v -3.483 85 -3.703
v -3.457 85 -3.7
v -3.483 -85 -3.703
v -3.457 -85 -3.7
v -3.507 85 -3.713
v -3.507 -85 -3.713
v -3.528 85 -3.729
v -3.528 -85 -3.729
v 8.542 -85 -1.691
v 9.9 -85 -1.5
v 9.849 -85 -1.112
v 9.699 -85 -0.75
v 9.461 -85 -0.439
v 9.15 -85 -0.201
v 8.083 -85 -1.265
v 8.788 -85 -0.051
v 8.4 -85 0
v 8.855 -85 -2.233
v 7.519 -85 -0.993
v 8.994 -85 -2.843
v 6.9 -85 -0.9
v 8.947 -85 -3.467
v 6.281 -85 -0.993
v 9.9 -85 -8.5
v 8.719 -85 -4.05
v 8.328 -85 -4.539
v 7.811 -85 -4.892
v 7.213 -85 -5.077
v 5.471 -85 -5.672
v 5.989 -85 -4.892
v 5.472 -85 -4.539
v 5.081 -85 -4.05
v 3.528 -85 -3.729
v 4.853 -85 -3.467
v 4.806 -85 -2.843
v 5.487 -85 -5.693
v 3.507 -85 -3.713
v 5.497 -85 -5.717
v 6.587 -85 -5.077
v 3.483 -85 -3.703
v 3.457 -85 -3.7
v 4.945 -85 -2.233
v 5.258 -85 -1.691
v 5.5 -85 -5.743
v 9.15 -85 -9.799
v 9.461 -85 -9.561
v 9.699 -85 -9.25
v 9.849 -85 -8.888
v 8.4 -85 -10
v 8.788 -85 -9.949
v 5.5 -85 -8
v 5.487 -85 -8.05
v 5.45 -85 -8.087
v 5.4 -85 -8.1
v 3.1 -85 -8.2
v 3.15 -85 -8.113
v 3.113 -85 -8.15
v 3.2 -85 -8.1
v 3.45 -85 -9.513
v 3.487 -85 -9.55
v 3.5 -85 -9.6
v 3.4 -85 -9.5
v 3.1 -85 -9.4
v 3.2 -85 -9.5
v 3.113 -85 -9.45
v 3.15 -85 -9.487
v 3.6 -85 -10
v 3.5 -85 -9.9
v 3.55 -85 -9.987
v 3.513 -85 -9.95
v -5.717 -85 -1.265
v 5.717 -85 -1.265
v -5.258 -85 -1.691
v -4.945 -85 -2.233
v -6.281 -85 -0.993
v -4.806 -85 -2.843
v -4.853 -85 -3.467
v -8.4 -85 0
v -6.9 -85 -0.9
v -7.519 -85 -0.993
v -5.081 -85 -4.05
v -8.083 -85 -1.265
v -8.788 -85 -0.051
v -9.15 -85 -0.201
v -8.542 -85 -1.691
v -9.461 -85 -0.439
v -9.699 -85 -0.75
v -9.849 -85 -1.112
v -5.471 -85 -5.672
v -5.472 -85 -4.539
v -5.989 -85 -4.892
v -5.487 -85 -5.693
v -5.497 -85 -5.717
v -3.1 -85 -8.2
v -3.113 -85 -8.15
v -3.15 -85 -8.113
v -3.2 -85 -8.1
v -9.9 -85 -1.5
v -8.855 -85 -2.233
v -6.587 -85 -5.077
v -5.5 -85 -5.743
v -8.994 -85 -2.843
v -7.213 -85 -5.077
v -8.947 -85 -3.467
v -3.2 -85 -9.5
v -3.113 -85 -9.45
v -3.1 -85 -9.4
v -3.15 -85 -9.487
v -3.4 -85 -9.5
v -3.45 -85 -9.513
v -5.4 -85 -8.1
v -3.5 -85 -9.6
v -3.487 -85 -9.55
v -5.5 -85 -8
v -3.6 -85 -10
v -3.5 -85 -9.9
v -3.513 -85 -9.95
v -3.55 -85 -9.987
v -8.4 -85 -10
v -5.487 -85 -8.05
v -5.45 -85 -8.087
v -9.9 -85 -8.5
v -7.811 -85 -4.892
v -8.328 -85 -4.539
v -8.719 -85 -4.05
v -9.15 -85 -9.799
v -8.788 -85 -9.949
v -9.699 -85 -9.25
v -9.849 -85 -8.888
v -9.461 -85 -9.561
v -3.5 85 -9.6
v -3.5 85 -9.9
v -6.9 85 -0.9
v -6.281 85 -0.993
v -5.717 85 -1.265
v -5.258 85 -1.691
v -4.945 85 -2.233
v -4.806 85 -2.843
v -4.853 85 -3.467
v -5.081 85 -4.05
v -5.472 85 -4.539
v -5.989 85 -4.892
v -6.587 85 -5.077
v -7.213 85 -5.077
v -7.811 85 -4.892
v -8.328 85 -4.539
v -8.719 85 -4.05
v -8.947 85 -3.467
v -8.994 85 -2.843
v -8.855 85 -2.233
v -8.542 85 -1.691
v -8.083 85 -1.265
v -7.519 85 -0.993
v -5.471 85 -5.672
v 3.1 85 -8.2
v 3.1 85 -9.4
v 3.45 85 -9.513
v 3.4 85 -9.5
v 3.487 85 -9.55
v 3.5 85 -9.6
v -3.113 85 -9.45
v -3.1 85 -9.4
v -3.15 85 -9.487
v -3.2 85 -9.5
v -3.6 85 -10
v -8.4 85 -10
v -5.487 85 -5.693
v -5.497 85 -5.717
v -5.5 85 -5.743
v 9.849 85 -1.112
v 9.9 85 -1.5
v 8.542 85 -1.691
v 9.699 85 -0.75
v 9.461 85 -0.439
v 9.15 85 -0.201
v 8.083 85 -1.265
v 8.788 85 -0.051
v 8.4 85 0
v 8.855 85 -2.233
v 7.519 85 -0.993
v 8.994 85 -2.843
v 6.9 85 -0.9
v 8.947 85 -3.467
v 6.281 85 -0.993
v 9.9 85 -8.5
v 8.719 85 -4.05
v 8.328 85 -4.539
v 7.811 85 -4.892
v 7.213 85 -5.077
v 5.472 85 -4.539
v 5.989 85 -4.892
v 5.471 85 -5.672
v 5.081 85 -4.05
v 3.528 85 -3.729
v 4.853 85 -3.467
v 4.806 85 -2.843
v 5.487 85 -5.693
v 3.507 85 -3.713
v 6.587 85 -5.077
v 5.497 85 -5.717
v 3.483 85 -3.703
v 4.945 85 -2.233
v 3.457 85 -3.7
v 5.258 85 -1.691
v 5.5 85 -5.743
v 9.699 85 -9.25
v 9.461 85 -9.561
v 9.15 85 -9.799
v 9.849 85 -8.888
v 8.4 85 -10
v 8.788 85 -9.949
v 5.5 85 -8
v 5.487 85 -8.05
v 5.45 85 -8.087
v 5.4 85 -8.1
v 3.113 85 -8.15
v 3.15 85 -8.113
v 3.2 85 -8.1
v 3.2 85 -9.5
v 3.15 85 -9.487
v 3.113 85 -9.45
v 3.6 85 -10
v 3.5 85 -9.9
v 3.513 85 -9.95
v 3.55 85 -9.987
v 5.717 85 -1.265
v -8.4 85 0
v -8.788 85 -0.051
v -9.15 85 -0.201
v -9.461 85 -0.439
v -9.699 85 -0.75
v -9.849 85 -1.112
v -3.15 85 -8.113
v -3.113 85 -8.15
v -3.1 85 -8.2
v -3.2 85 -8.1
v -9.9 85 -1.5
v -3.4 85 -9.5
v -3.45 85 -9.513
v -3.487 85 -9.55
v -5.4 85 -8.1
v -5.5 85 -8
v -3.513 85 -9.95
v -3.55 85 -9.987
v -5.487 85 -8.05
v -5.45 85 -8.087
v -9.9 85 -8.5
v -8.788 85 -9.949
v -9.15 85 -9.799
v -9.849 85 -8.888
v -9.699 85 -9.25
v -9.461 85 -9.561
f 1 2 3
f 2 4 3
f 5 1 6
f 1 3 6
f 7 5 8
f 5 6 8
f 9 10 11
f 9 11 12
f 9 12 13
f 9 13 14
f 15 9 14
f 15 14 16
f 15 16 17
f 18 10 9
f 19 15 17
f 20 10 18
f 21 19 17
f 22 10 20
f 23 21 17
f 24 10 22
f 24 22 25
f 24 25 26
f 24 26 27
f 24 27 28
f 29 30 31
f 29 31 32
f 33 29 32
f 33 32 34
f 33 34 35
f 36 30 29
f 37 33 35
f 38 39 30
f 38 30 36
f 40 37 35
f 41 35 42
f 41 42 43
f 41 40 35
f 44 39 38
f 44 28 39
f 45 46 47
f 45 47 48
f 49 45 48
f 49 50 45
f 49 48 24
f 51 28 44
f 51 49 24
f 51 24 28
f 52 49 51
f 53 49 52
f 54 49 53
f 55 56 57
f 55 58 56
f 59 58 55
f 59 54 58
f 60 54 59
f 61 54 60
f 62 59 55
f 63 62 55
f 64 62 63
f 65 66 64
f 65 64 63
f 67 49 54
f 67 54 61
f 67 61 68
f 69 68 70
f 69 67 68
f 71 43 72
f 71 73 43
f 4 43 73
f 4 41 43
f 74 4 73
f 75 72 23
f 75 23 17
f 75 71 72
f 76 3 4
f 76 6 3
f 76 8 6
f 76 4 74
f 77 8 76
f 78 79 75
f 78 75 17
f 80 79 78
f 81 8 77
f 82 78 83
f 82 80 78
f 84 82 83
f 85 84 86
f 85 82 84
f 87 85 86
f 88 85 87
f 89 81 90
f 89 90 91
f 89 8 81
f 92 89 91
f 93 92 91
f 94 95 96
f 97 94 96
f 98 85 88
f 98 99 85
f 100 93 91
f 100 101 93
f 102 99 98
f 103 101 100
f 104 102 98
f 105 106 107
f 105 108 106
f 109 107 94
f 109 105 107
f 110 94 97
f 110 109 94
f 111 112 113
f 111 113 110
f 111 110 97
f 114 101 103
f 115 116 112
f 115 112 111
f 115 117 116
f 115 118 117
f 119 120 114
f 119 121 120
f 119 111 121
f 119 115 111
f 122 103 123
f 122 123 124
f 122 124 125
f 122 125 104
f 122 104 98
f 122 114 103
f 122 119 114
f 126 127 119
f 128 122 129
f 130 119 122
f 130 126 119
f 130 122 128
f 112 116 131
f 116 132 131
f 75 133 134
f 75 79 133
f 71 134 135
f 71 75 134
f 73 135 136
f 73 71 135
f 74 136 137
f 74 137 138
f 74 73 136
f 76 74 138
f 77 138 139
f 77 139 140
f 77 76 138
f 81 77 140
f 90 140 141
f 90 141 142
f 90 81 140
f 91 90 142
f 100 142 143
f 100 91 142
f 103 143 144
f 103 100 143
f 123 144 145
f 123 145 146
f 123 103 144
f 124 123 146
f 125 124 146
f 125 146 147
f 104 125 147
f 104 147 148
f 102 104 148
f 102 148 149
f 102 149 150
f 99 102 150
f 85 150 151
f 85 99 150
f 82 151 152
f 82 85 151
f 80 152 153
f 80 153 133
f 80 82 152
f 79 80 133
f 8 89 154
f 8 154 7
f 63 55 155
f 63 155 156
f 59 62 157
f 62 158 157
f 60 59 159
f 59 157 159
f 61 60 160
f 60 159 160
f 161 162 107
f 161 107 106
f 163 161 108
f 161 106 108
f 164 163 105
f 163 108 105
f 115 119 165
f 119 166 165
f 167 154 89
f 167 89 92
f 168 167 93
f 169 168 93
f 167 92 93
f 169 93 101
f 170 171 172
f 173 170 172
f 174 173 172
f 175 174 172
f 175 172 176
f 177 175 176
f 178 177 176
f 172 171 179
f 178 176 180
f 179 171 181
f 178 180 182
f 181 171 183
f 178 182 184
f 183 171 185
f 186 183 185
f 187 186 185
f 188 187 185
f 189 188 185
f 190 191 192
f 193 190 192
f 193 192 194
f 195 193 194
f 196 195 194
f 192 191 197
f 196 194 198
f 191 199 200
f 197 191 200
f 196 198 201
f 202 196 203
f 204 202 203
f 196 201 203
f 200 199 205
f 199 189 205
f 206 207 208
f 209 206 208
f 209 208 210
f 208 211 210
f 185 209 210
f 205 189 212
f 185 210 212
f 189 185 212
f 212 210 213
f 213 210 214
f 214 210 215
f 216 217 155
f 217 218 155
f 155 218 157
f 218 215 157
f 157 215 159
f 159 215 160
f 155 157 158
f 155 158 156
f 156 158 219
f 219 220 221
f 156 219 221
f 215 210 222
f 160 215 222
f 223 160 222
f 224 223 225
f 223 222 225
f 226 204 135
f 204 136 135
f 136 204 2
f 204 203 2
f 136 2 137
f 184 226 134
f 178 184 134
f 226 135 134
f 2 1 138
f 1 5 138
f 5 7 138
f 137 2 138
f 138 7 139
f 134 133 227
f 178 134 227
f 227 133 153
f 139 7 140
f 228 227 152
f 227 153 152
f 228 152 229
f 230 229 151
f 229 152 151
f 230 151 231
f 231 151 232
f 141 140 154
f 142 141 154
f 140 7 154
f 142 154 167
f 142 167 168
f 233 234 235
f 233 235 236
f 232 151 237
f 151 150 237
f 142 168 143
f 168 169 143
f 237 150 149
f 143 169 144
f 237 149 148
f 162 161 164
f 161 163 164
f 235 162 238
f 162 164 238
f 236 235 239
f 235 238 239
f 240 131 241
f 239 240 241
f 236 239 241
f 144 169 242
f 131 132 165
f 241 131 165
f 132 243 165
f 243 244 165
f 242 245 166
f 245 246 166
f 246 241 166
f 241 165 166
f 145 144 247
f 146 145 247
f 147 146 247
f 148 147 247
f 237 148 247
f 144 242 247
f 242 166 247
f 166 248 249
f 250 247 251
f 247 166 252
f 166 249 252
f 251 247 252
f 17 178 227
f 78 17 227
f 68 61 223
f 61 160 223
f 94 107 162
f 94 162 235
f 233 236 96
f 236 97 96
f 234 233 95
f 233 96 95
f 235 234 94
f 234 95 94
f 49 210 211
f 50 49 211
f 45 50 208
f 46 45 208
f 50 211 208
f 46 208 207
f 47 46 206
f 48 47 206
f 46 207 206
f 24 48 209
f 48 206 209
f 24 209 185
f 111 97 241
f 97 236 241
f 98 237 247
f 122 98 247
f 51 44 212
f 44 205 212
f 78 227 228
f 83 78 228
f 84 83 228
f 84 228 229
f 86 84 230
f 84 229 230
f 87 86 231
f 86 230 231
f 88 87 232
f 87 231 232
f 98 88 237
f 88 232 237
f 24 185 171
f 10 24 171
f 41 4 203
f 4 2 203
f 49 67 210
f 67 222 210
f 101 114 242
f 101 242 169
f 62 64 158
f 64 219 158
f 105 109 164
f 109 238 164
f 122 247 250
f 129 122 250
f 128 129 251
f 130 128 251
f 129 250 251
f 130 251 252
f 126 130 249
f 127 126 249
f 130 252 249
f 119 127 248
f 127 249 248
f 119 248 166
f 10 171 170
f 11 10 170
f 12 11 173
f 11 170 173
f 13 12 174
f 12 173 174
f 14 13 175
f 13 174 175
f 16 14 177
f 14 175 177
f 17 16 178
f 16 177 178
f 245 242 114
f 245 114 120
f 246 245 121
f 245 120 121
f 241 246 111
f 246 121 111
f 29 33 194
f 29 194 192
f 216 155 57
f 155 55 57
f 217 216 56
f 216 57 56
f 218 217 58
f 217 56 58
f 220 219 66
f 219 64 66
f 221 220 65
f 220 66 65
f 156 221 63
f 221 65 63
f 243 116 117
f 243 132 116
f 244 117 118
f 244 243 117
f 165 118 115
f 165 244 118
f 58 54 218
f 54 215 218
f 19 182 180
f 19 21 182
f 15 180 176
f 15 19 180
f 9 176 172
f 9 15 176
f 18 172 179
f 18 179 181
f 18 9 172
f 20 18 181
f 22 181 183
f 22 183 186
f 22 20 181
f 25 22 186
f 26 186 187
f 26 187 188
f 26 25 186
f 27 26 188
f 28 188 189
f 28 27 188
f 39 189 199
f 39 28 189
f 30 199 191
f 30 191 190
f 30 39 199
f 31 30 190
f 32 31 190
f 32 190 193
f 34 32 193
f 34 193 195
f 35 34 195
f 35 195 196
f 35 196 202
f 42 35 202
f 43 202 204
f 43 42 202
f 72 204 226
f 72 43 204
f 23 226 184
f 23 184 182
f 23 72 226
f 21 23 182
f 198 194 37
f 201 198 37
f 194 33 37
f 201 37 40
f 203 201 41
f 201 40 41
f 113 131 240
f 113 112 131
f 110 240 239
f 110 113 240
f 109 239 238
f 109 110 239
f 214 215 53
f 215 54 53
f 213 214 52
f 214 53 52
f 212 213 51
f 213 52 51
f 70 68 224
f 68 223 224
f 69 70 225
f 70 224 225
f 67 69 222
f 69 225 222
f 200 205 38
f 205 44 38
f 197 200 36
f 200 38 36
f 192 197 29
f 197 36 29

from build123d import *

# Parameters (mm, degrees)
SKETCH_1_R      = 2.1
EXTRUDE_1_DEPTH = 85
FILLET_1_R      = 0.1


with BuildPart() as part:
    # 草图1 → 凸台-拉伸1 (new, symmetric)
    with BuildSketch(Plane(origin=(0, 0, 0), x_dir=(1, 0, 0), z_dir=(0, 1, 0))):
        with BuildLine():
            Line((-3.5, 10), (-3.5, 9.5))
            Line((-3.5, 9.5), (-3.1, 9.5))
            Line((-3.1, 9.5), (-3.1, 8.1))
            Line((-3.1, 8.1), (-5.5, 8.1))
            Line((-5.5, 8.1), (-5.5, 5.701219331))
            Line((-5.5, 5.701219331), (-3.498780669, 3.7))
            Line((-3.498780669, 3.7), (3.498780669, 3.7))
            Line((3.498780669, 3.7), (5.5, 5.701219331))
            Line((5.5, 5.701219331), (5.5, 8.1))
            Line((5.5, 8.1), (3.1, 8.1))
            Line((3.1, 8.1), (3.1, 9.5))
            Line((3.1, 9.5), (3.5, 9.5))
            Line((3.5, 9.5), (3.5, 10))
            Line((3.5, 10), (8.4, 10))
            ThreePointArc((8.4, 10), (9.460660172, 9.560660172), (9.9, 8.5))
            Line((9.9, 8.5), (9.9, 1.5))
            ThreePointArc((9.9, 1.5), (9.460660172, 0.439339828), (8.4, 0))
            Line((8.4, 0), (-8.4, 0))
            ThreePointArc((-8.4, 0), (-9.460660172, 0.439339828), (-9.9, 1.5))
            Line((-9.9, 1.5), (-9.9, 8.5))
            ThreePointArc((-9.9, 8.5), (-9.460660172, 9.560660172), (-8.4, 10))
            Line((-8.4, 10), (-3.5, 10))
        make_face()
        with Locations(Location((-6.9, 3, 0), (0, 0, 270))):
            Circle(SKETCH_1_R, mode=Mode.SUBTRACT)
        with Locations(Location((6.9, 3, 0), (0, 0, 270))):
            Circle(SKETCH_1_R, mode=Mode.SUBTRACT)
    extrude(amount=EXTRUDE_1_DEPTH, both=True)

    # 圆角1
    fillet_1_edges = [part.edges().sort_by_distance(p)[0] for p in [
        (-3.5, 0, -10),
        (-3.5, 0, -9.5),
        (-3.1, 0, -9.5),
        (-3.1, 0, -8.1),
        (-5.5, 0, -8.1),
        (-5.5, 0, -5.701219331),
        (-3.498780669, 0, -3.7),
        (3.498780669, 0, -3.7),
        (5.5, 0, -5.701219331),
        (5.5, 0, -8.1),
        (3.1, 0, -8.1),
        (3.1, 0, -9.5),
        (3.5, 0, -9.5),
        (3.5, 0, -10),
    ]]
    fillet(fillet_1_edges, radius=FILLET_1_R)


solid = part.part
